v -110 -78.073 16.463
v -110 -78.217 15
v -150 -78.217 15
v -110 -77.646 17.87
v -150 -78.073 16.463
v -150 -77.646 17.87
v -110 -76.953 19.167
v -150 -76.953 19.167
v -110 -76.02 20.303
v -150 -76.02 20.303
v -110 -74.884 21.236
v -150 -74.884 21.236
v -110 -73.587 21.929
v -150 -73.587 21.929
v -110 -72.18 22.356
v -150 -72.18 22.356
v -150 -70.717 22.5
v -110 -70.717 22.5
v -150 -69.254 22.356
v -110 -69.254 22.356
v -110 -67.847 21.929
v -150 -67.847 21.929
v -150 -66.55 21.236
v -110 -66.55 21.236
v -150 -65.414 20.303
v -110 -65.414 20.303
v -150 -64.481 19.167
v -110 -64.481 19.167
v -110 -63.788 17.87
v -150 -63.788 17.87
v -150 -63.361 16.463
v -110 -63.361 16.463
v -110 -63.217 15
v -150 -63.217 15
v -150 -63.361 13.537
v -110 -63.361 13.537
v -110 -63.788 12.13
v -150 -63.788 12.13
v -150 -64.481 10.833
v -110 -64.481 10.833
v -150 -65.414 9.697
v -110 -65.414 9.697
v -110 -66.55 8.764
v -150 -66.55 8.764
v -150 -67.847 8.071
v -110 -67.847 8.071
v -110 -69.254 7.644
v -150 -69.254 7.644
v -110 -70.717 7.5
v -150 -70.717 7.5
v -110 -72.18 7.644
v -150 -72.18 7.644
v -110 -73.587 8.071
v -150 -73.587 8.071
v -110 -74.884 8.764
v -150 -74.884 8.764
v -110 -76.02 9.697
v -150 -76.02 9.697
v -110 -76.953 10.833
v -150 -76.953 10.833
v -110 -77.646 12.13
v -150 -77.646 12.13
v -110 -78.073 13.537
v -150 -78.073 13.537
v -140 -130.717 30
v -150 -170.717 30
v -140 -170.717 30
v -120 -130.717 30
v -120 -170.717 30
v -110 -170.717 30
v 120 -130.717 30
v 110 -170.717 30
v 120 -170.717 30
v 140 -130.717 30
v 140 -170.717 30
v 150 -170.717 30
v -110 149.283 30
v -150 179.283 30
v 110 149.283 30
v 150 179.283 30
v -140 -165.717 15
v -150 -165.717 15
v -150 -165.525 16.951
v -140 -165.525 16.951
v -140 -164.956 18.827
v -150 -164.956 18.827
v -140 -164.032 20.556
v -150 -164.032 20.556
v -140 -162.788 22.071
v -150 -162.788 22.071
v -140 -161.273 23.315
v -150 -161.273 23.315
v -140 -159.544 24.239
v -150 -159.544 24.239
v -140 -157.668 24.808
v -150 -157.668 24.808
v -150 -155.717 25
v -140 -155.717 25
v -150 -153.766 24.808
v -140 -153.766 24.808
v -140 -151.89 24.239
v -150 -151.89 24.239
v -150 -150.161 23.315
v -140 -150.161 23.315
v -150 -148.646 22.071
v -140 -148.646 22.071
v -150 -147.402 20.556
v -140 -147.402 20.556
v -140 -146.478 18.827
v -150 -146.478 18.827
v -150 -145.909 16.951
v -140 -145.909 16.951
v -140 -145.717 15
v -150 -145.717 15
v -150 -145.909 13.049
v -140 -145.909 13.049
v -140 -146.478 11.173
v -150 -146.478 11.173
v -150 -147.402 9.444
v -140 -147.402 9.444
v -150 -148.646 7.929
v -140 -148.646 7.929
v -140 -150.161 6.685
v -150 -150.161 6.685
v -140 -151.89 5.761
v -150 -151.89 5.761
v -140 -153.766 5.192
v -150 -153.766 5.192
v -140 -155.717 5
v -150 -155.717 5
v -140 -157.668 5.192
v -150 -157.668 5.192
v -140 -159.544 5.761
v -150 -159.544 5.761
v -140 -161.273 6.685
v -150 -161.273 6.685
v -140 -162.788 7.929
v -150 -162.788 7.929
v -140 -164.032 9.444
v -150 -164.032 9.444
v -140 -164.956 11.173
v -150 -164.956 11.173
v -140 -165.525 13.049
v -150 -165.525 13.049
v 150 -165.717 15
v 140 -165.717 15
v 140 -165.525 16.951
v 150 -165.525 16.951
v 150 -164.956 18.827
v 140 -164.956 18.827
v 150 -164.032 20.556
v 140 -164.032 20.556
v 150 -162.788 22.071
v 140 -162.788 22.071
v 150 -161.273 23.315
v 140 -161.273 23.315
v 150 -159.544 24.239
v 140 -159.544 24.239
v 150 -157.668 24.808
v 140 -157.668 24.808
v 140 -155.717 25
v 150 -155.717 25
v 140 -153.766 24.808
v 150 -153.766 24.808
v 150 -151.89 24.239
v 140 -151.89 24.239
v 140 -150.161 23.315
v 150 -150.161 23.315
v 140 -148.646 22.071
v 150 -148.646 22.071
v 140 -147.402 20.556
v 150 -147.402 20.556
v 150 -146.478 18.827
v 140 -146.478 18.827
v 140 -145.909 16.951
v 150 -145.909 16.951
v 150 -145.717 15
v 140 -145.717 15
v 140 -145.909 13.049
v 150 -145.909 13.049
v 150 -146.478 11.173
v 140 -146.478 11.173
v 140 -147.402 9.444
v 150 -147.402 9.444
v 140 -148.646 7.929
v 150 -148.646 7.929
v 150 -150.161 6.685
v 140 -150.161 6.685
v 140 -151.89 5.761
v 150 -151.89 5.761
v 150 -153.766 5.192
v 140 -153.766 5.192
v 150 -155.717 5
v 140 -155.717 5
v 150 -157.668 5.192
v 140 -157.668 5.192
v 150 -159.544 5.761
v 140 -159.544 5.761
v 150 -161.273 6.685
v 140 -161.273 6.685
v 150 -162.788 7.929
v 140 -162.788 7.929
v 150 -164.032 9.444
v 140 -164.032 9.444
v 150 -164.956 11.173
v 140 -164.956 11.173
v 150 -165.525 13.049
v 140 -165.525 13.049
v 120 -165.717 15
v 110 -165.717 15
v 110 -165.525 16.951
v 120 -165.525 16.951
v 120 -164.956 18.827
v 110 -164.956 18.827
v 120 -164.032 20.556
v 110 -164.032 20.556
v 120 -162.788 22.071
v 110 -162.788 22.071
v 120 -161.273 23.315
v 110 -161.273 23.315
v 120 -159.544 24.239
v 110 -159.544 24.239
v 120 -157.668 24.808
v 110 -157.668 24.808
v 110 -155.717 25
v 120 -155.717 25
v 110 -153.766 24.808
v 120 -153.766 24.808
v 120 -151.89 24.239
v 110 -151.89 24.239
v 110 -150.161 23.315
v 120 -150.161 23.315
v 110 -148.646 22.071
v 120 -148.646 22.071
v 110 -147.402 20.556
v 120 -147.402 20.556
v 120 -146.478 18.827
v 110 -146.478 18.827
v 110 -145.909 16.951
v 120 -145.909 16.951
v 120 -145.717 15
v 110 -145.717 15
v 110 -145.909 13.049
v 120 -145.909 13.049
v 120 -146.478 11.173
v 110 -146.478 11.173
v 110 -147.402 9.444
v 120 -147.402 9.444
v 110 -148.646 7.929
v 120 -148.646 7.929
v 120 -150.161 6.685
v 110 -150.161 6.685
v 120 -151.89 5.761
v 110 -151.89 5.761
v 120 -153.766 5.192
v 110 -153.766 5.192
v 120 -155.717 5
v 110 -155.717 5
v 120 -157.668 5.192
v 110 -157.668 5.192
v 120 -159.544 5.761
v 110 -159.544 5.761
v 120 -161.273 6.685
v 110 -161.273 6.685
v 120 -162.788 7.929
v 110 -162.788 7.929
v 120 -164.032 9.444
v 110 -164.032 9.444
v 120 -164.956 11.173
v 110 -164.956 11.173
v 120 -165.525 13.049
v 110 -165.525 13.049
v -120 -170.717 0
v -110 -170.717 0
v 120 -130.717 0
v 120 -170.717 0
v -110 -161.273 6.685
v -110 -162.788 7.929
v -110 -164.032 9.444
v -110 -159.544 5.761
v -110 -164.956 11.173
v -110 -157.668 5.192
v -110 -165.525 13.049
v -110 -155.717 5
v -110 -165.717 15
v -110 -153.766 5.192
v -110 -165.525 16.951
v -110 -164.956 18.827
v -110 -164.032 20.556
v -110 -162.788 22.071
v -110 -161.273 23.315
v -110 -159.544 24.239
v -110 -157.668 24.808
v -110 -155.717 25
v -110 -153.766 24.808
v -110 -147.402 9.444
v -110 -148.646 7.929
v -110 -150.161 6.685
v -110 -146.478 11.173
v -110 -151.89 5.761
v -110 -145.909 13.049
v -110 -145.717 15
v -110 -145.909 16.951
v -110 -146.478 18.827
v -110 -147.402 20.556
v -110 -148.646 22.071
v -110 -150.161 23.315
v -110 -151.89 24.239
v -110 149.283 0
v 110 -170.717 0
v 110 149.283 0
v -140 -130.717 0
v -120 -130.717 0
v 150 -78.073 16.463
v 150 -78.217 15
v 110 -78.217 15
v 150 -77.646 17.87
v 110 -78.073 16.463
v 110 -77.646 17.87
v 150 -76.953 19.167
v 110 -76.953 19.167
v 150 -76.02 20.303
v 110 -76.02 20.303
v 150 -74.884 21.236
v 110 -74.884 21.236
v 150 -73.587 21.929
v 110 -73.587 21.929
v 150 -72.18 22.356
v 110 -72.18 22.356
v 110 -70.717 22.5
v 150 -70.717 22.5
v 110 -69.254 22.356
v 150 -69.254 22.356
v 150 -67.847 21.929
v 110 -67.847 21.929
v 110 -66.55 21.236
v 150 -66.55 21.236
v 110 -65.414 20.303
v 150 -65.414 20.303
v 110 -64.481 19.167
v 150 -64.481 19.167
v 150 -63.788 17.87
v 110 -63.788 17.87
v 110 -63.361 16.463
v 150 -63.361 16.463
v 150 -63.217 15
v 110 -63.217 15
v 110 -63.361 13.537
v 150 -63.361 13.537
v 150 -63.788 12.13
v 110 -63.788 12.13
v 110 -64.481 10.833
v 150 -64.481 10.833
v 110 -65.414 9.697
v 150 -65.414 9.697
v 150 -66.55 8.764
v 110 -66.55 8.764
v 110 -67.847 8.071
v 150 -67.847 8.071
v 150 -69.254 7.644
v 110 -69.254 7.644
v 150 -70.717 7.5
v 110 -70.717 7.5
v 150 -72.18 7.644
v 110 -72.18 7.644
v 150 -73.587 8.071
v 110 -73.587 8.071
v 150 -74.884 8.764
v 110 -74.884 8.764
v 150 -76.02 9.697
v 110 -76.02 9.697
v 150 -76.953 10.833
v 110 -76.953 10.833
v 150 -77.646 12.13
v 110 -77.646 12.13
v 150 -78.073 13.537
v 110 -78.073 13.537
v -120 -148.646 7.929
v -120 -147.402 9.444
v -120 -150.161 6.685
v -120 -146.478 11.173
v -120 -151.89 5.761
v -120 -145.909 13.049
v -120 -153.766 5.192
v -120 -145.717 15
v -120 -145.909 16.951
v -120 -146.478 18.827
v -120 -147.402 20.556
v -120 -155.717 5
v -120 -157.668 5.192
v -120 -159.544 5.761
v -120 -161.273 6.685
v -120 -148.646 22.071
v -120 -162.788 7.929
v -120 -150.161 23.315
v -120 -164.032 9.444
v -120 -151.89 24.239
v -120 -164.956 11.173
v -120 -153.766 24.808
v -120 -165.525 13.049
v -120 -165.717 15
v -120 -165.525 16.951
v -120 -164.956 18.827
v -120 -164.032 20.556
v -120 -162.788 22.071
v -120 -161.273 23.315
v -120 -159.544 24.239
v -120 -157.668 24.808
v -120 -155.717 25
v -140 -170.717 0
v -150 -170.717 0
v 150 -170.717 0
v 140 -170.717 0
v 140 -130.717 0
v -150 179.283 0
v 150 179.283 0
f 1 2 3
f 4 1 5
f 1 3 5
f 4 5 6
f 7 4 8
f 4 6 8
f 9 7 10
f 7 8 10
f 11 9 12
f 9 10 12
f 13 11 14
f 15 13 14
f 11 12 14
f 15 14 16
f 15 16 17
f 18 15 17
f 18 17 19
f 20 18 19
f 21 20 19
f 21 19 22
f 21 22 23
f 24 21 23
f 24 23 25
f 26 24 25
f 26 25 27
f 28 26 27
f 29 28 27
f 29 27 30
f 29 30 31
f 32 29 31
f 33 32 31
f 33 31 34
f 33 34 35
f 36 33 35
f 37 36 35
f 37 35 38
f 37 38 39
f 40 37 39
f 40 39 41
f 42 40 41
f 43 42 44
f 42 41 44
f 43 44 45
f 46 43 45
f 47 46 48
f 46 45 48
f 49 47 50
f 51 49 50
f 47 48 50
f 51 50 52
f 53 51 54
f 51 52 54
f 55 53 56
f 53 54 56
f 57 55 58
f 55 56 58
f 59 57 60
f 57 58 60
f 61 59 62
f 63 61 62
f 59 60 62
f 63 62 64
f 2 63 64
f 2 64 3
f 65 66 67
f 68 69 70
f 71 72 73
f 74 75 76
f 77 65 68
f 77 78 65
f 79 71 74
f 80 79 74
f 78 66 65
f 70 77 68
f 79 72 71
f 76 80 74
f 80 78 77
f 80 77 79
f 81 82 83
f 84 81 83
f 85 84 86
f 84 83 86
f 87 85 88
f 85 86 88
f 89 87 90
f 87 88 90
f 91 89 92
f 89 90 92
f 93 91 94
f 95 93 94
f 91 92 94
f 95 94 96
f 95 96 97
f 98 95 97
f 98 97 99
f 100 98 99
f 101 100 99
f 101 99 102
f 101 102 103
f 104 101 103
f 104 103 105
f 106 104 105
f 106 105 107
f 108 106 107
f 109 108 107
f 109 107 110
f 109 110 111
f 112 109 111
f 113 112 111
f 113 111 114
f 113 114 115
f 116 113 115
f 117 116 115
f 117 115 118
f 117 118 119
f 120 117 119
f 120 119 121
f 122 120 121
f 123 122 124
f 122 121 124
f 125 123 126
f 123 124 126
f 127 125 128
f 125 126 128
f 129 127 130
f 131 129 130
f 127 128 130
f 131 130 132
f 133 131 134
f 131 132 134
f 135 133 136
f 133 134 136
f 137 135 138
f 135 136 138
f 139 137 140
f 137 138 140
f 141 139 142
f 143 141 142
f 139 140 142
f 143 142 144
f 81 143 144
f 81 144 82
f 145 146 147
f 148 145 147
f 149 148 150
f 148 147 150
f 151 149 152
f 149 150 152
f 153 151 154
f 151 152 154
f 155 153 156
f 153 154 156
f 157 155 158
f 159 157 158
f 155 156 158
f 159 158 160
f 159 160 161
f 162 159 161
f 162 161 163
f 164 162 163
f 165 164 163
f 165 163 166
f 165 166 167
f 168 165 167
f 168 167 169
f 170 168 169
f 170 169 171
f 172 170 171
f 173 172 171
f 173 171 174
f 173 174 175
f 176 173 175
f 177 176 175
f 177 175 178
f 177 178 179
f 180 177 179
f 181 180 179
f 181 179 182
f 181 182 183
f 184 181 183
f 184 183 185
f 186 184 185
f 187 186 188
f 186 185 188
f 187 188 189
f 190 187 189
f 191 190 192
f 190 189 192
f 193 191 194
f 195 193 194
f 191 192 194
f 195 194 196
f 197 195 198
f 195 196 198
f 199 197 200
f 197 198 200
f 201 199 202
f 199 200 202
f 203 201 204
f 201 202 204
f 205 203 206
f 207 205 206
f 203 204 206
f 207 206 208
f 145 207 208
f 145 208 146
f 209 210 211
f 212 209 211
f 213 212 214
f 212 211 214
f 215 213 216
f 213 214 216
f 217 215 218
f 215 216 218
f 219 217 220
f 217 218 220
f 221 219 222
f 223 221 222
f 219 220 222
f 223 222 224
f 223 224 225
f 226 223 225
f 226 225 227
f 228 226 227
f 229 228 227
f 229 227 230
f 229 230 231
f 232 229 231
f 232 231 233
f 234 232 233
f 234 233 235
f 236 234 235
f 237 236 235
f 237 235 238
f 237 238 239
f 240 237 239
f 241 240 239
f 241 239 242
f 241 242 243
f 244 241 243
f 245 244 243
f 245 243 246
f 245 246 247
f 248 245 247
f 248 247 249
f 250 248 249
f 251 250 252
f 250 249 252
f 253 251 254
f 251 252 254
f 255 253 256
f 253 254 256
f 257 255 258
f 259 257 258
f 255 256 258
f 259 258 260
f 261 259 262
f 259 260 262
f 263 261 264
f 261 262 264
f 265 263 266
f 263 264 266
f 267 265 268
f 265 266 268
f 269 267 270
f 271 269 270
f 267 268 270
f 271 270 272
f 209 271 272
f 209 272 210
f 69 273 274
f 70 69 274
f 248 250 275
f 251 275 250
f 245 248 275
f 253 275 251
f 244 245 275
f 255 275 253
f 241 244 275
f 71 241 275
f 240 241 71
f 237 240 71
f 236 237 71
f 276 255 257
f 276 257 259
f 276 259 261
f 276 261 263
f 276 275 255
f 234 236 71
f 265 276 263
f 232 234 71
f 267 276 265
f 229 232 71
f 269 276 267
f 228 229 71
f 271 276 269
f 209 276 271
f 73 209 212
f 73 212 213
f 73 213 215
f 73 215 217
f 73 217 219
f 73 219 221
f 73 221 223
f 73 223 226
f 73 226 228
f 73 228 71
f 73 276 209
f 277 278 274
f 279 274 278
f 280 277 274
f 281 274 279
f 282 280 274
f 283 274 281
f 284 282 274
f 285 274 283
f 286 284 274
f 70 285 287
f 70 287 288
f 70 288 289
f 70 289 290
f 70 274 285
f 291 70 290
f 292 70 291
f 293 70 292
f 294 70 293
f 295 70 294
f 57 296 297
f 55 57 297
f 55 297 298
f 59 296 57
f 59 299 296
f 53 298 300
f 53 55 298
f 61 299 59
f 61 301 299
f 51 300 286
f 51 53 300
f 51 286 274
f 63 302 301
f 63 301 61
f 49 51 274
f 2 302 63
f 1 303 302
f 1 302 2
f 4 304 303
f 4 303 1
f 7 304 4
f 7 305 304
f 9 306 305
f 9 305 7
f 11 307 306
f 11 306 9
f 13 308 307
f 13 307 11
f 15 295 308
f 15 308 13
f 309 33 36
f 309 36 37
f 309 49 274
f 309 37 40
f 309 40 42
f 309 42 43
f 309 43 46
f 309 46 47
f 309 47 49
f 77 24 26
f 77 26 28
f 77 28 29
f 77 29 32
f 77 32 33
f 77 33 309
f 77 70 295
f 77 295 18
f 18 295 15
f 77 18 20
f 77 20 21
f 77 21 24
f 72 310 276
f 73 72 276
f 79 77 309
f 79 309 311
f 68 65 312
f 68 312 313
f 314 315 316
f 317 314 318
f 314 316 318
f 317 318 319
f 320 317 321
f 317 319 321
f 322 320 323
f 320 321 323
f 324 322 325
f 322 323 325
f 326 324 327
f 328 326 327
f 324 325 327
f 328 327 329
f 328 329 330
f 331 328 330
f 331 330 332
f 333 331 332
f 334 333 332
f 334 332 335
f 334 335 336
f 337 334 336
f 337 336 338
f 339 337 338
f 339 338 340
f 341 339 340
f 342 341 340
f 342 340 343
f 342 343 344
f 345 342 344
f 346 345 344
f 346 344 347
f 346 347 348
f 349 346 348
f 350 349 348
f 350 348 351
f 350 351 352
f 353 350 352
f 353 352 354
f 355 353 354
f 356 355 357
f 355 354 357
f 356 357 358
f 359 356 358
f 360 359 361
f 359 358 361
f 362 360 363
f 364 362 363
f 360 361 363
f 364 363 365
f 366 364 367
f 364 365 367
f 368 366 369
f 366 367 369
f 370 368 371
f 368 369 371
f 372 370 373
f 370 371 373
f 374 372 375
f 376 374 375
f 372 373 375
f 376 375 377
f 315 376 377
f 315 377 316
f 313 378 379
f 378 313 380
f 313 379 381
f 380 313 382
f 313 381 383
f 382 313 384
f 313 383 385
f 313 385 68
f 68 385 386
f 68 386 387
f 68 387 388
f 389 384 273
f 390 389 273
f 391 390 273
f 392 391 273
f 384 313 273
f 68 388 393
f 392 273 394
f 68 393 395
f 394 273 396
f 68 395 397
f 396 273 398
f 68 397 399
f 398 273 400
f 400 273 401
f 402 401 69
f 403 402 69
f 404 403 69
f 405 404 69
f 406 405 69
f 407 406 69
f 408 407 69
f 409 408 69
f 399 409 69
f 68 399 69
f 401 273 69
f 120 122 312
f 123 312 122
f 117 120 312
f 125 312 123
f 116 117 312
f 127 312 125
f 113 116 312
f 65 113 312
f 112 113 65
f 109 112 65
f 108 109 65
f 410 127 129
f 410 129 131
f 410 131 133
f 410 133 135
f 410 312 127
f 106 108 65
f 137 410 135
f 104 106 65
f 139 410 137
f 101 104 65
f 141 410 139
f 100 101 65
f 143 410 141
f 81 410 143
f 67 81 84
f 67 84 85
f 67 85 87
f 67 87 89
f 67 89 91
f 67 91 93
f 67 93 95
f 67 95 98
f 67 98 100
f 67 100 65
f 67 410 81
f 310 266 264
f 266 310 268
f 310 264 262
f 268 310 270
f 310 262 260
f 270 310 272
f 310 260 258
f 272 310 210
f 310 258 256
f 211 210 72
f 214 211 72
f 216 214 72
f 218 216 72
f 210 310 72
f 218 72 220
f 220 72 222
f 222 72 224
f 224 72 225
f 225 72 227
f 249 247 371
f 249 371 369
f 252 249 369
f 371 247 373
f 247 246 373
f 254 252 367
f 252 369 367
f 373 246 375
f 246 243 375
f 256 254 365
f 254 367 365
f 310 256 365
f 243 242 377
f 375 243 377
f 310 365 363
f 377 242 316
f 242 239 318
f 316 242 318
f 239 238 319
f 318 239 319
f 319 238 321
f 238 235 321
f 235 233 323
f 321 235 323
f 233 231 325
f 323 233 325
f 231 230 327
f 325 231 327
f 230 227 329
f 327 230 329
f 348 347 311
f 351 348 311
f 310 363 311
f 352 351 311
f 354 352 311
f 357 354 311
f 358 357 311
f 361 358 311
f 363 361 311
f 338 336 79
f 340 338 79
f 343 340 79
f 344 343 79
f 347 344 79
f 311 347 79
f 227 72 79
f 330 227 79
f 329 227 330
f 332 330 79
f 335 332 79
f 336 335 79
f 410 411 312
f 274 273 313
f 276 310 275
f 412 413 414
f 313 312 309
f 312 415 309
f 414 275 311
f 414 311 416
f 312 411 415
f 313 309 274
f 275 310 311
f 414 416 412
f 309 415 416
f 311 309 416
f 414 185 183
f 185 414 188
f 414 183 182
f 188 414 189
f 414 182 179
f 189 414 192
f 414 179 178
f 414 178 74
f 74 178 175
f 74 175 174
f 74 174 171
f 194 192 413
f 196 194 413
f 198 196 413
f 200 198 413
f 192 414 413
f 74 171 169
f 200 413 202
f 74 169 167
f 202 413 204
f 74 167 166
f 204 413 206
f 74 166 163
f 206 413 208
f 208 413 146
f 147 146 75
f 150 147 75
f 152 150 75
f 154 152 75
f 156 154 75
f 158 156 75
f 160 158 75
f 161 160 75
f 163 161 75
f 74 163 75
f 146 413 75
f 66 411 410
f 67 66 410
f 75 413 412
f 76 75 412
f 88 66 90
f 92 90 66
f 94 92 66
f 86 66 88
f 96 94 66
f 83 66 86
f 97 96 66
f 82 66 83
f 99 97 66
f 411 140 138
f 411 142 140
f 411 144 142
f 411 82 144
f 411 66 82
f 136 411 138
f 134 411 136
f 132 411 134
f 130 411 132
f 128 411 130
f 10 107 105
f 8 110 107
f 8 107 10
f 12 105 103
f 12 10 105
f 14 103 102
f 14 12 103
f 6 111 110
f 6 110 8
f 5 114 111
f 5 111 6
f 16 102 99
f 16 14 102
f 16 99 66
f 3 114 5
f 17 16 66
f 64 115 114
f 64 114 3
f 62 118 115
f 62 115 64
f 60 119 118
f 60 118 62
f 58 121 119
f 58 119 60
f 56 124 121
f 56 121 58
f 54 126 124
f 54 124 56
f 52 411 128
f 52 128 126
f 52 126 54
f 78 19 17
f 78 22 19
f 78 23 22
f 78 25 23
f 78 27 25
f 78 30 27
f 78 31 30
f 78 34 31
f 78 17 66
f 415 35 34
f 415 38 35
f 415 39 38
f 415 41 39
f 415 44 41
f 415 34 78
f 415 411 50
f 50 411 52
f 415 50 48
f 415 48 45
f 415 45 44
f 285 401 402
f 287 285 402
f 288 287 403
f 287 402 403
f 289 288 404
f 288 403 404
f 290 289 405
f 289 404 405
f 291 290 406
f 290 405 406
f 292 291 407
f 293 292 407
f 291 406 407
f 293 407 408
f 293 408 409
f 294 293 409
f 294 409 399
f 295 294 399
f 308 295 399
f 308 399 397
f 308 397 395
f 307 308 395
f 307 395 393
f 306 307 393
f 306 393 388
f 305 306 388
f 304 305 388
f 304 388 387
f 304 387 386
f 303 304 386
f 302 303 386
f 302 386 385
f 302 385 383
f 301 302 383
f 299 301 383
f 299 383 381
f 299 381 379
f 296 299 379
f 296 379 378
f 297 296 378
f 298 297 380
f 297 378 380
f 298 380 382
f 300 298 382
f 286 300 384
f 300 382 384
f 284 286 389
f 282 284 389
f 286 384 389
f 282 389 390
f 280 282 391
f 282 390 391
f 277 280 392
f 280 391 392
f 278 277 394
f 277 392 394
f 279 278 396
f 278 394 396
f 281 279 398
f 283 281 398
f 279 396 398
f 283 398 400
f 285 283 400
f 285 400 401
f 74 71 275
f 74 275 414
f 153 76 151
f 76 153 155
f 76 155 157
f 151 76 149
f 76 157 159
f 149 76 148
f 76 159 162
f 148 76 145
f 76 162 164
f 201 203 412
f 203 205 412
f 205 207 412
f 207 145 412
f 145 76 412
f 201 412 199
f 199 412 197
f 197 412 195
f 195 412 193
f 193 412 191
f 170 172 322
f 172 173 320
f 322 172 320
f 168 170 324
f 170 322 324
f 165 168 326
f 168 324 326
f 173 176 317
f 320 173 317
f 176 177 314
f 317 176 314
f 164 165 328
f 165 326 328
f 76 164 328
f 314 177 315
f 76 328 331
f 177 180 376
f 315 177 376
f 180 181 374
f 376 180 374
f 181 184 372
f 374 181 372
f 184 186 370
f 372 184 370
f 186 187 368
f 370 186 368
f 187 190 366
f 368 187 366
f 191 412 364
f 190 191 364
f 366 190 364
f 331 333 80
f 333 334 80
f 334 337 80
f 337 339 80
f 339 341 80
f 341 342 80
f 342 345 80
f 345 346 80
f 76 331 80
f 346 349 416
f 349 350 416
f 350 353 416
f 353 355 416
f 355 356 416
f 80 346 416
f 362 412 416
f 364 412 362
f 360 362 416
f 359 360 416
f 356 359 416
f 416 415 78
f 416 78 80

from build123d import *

# Parameters (mm, degrees)
SKETCH2_W           = 300
SKETCH2_H           = 350
BOSS_EXTRUDE1_DEPTH = 30
SKETCH3_W           = 220
SKETCH3_H           = 320
CUT_EXTRUDE1_DEPTH  = 236.67423904
SKETCH4_R           = 7.5
SKETCH4_R_2         = 10
CUT_EXTRUDE2_DEPTH  = 351.773925694
SKETCH7_W           = 20
SKETCH7_H           = 30
CUT_EXTRUDE3_DEPTH  = 40
SKETCH8_W           = 20
SKETCH8_H           = 30
CUT_EXTRUDE4_DEPTH  = 40


with BuildPart() as part:
    # Sketch2 → Boss-Extrude1 (new body)
    with BuildSketch(Plane.XY):
        with Locations((0, 4.282868526)):
            Rectangle(SKETCH2_W, SKETCH2_H)
    extrude(amount=BOSS_EXTRUDE1_DEPTH)

    # Sketch3 → Cut-Extrude1 (cut, through all)
    with BuildSketch(Plane.XY.offset(30)):
        with Locations((0, -10.717131474)):
            Rectangle(SKETCH3_W, SKETCH3_H)
    extrude(amount=-CUT_EXTRUDE1_DEPTH, mode=Mode.SUBTRACT)

    # Sketch4 → Cut-Extrude2 (cut, through all)
    with BuildSketch(Plane.ZY.offset(150)):
        with Locations(Location((15, -70.717131474, 0), (0, 0, 270))):
            Circle(SKETCH4_R)
        with Locations(Location((15, -155.717131474, 0), (0, 0, 270))):
            Circle(SKETCH4_R_2)
    extrude(amount=-CUT_EXTRUDE2_DEPTH, mode=Mode.SUBTRACT)

    # Sketch7 → Cut-Extrude3 (cut)
    with BuildSketch(Plane.XZ.offset(170.717131474)):
        with Locations((-130, 15)):
            Rectangle(SKETCH7_W, SKETCH7_H)
    extrude(amount=-CUT_EXTRUDE3_DEPTH, mode=Mode.SUBTRACT)

    # Sketch8 → Cut-Extrude4 (cut)
    with BuildSketch(Plane.XZ.offset(170.717131474)):
        with Locations((130, 15)):
            Rectangle(SKETCH8_W, SKETCH8_H)
    extrude(amount=-CUT_EXTRUDE4_DEPTH, mode=Mode.SUBTRACT)


solid = part.part
